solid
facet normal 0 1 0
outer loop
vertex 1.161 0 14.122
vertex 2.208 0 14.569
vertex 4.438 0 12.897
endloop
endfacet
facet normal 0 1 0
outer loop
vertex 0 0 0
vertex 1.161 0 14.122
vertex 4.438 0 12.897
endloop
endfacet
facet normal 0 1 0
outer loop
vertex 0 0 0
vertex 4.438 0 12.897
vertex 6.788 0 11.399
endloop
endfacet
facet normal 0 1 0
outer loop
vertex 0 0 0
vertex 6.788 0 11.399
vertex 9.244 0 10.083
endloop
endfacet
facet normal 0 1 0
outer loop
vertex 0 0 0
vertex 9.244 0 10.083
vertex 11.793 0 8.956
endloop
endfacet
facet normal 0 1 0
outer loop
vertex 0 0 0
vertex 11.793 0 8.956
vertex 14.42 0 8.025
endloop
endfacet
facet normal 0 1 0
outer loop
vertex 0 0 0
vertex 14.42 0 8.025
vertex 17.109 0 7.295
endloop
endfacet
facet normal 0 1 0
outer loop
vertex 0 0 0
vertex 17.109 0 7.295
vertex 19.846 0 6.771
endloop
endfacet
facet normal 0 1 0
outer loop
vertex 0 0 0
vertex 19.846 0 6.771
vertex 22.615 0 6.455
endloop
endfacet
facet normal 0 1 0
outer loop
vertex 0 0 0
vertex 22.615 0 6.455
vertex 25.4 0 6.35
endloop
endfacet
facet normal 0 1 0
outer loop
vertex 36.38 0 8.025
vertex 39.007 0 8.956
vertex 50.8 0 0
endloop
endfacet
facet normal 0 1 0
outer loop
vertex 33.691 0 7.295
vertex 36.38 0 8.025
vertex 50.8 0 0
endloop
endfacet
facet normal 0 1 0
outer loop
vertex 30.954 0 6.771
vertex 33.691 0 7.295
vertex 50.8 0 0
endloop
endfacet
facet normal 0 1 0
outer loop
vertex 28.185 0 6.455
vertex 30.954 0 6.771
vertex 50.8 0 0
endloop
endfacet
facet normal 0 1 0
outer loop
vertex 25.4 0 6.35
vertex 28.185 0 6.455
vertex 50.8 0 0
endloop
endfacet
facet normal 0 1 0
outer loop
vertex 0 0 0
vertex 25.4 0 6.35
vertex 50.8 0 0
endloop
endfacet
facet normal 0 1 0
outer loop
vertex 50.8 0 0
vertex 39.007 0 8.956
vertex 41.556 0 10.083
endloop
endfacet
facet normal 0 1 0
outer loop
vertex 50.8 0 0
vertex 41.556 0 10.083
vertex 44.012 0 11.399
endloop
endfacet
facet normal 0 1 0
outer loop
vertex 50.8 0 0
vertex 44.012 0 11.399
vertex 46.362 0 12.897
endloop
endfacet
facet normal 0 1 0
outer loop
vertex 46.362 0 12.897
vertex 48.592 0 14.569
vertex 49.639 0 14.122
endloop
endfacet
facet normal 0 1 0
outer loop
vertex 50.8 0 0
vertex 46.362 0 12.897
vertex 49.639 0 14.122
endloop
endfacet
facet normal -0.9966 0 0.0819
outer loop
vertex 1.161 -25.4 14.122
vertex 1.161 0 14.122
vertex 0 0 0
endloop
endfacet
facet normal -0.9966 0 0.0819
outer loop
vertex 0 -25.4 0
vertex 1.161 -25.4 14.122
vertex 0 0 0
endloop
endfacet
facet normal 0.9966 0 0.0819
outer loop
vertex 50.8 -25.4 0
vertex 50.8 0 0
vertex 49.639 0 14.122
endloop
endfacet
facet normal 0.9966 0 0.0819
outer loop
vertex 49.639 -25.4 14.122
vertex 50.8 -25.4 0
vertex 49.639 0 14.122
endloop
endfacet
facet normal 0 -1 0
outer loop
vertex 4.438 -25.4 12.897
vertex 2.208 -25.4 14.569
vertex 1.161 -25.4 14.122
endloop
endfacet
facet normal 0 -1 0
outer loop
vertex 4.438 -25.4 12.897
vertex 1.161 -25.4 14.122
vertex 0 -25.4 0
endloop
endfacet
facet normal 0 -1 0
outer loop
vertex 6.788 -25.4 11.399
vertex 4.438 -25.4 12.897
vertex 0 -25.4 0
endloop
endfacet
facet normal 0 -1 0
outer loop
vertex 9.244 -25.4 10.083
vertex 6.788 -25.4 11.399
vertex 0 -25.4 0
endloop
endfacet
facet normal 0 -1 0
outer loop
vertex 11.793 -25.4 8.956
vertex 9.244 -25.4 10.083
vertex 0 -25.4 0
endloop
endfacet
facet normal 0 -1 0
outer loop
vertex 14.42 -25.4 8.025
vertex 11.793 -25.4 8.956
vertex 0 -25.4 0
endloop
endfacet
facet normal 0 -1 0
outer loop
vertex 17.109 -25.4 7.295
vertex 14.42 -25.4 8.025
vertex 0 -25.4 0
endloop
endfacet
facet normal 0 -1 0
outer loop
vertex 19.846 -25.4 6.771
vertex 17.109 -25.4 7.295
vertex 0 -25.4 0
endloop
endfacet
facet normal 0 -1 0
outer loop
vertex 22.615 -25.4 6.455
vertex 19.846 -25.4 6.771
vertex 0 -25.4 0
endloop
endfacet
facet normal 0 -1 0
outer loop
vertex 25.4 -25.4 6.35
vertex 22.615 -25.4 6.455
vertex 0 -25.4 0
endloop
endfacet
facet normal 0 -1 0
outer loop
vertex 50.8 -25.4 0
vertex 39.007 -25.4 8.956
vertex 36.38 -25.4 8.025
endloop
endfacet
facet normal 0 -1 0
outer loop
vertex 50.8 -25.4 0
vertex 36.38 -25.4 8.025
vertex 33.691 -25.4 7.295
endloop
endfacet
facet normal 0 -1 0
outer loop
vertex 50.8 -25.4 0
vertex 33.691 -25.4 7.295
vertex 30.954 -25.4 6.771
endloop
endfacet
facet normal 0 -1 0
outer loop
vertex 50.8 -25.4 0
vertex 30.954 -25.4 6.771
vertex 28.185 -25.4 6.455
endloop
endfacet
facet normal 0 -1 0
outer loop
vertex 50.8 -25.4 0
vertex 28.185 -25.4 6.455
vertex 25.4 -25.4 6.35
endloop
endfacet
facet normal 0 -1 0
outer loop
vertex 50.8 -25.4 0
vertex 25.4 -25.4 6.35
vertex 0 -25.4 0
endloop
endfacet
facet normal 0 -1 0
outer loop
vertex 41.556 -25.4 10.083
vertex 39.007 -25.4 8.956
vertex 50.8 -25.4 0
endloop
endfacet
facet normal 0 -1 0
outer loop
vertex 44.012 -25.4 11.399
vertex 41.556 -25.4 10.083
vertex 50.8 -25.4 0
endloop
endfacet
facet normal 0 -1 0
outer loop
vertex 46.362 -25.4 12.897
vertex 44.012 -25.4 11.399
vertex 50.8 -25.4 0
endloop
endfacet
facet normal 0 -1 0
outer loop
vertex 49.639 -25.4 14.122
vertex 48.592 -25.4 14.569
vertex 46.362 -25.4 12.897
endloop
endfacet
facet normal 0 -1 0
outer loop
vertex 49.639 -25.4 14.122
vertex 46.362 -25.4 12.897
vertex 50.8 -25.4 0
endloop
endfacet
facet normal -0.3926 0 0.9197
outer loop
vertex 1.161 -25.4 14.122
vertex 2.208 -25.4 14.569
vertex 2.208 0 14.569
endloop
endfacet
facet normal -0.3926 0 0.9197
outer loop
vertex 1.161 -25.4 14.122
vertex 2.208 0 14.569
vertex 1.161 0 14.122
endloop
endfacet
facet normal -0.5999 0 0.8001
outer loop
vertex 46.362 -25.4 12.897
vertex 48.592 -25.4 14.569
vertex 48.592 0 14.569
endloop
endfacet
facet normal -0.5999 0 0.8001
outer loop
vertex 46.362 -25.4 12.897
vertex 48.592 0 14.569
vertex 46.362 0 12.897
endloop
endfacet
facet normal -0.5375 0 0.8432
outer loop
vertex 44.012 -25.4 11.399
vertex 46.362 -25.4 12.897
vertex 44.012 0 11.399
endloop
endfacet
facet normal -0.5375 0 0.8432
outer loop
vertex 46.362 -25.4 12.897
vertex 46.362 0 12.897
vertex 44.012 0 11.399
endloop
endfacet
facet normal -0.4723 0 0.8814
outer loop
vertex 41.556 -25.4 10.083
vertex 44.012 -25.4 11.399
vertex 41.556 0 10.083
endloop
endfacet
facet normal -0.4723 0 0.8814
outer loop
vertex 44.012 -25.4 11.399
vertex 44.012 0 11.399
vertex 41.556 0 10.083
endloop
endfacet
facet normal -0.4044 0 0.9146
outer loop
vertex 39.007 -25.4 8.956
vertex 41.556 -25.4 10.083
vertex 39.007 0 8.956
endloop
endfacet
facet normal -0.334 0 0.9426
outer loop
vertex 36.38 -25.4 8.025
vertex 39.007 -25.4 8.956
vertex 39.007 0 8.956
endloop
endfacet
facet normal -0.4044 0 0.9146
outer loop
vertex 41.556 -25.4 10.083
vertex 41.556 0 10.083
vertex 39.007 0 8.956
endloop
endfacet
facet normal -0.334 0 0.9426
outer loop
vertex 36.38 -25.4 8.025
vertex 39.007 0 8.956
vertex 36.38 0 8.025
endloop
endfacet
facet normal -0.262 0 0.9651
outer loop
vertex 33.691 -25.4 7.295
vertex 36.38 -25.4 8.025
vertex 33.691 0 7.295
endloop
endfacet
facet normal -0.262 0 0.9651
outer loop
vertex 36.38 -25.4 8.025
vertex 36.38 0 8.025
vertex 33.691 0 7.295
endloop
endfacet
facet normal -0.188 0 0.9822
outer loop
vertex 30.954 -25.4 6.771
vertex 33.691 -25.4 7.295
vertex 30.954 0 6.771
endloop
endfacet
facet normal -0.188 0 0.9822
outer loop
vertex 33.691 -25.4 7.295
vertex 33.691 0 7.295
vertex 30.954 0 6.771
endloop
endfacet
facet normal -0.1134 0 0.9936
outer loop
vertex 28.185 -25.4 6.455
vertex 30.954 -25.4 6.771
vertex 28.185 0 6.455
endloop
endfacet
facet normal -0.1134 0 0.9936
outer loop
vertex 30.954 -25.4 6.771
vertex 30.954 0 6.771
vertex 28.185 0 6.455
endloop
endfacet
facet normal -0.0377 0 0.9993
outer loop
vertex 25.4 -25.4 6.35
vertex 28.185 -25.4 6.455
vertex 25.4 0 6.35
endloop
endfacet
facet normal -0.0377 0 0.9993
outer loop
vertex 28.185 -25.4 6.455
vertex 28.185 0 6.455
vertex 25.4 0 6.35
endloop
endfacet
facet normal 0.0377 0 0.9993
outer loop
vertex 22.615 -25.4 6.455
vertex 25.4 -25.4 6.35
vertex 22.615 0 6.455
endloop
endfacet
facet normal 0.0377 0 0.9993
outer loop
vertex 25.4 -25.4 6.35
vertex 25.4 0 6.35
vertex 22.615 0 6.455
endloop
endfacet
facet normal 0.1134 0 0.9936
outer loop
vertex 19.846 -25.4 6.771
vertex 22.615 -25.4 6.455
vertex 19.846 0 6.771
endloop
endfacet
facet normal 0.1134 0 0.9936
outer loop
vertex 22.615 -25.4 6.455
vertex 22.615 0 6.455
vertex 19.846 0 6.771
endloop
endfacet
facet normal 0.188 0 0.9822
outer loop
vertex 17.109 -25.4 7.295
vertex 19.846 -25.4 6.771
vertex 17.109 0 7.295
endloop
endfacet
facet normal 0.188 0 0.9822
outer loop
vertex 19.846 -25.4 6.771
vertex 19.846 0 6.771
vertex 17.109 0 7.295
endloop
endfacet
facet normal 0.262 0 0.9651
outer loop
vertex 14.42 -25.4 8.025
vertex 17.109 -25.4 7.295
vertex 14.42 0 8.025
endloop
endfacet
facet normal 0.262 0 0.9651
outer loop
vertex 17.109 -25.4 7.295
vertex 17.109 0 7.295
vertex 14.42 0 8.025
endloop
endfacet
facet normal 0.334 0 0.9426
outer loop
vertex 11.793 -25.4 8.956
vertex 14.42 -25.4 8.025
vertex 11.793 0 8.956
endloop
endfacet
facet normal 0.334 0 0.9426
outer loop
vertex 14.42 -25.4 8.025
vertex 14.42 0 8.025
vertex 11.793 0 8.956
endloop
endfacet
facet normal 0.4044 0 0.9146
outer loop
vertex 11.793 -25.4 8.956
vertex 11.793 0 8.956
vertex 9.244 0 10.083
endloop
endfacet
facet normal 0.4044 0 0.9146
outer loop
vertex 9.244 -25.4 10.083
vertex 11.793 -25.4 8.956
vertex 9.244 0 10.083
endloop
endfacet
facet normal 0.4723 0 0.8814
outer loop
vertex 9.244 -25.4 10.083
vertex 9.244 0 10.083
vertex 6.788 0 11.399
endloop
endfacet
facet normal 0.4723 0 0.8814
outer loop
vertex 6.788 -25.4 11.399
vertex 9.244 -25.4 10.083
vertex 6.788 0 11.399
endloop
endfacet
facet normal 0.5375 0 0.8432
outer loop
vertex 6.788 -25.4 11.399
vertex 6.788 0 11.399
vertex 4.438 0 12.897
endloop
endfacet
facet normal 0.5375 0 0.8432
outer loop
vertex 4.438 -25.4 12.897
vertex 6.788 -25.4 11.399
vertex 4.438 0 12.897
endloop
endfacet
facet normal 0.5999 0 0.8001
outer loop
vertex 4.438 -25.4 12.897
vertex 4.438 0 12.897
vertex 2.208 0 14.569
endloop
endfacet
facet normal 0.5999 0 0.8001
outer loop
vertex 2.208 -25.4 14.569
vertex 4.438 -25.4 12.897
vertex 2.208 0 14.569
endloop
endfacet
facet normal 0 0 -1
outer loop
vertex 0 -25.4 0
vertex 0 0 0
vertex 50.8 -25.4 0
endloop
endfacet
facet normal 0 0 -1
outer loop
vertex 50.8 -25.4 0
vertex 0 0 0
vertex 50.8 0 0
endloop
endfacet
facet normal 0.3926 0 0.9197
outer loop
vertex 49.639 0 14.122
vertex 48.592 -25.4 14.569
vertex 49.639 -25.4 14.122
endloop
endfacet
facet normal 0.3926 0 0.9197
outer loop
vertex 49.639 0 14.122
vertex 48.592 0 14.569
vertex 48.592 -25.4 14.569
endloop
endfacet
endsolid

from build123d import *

# Parameters (mm, degrees)
F1_DEPTH    = 25.4
F2_T1_DEPTH = 31.742344746


# Not quite as in the source:
# - a fillet or chamfer that OpenCascade refuses, or shapes differently, is made with other operations: its cross-section is extruded or revolved along the edge and cut away or added


with BuildPart() as f1:
    # F0 (on Front) → F1 (new body)
    with BuildSketch(Plane.XZ):
        with BuildLine():
            Line((1.2633143634, 15.3614934534), (0, 0))
            Line((0, 0), (50.8, 0))
            Line((50.8, 0), (49.5366856366, 15.3614934534))
            ThreePointArc((49.5366856366, 15.3614934534), (25.4, 6.35), (1.2633143634, 15.3614934534))
        make_face()
    extrude(amount=F1_DEPTH)

    # F2: chamfer of 1.27 on 2 edges, made by hand

    # F2_s2 → F2_t1 (cut)
    with BuildSketch(Plane.XZ.offset(-3.171172373)):
        with BuildLine():
            Line((2.2549090841, 14.5889641953), (1.1146425309, 14.1017672287))
            Line((1.1146425309, 14.1017672287), (1.089327991, 14.103849072))
            ThreePointArc((1.089327991, 14.103849072), (1.1860490936, 14.7318712483), (1.2379998236, 15.3635752967))
            Line((1.2379998236, 15.3635752967), (1.2799603535, 15.3806786304))
            ThreePointArc((1.2799603535, 15.3806786304), (1.7575594643, 14.9733769005), (2.2709034327, 14.6086959162))
            Line((2.2709034327, 14.6086959162), (2.2549090841, 14.5889641953))
        make_face()
        with BuildLine():
            Line((48.5450909159, 14.5889641953), (49.6853574691, 14.1017672287))
            Line((49.6853574691, 14.1017672287), (49.710672009, 14.103849072))
            ThreePointArc((49.710672009, 14.103849072), (49.6139509064, 14.7318712483), (49.5620001764, 15.3635752967))
            Line((49.5620001764, 15.3635752967), (49.5200396465, 15.3806786304))
            ThreePointArc((49.5200396465, 15.3806786304), (49.0424405357, 14.9733769005), (48.5290965673, 14.6086959162))
            Line((48.5290965673, 14.6086959162), (48.5450909159, 14.5889641953))
        make_face()
    extrude(amount=F2_T1_DEPTH, mode=Mode.SUBTRACT)


solid = f1.part
